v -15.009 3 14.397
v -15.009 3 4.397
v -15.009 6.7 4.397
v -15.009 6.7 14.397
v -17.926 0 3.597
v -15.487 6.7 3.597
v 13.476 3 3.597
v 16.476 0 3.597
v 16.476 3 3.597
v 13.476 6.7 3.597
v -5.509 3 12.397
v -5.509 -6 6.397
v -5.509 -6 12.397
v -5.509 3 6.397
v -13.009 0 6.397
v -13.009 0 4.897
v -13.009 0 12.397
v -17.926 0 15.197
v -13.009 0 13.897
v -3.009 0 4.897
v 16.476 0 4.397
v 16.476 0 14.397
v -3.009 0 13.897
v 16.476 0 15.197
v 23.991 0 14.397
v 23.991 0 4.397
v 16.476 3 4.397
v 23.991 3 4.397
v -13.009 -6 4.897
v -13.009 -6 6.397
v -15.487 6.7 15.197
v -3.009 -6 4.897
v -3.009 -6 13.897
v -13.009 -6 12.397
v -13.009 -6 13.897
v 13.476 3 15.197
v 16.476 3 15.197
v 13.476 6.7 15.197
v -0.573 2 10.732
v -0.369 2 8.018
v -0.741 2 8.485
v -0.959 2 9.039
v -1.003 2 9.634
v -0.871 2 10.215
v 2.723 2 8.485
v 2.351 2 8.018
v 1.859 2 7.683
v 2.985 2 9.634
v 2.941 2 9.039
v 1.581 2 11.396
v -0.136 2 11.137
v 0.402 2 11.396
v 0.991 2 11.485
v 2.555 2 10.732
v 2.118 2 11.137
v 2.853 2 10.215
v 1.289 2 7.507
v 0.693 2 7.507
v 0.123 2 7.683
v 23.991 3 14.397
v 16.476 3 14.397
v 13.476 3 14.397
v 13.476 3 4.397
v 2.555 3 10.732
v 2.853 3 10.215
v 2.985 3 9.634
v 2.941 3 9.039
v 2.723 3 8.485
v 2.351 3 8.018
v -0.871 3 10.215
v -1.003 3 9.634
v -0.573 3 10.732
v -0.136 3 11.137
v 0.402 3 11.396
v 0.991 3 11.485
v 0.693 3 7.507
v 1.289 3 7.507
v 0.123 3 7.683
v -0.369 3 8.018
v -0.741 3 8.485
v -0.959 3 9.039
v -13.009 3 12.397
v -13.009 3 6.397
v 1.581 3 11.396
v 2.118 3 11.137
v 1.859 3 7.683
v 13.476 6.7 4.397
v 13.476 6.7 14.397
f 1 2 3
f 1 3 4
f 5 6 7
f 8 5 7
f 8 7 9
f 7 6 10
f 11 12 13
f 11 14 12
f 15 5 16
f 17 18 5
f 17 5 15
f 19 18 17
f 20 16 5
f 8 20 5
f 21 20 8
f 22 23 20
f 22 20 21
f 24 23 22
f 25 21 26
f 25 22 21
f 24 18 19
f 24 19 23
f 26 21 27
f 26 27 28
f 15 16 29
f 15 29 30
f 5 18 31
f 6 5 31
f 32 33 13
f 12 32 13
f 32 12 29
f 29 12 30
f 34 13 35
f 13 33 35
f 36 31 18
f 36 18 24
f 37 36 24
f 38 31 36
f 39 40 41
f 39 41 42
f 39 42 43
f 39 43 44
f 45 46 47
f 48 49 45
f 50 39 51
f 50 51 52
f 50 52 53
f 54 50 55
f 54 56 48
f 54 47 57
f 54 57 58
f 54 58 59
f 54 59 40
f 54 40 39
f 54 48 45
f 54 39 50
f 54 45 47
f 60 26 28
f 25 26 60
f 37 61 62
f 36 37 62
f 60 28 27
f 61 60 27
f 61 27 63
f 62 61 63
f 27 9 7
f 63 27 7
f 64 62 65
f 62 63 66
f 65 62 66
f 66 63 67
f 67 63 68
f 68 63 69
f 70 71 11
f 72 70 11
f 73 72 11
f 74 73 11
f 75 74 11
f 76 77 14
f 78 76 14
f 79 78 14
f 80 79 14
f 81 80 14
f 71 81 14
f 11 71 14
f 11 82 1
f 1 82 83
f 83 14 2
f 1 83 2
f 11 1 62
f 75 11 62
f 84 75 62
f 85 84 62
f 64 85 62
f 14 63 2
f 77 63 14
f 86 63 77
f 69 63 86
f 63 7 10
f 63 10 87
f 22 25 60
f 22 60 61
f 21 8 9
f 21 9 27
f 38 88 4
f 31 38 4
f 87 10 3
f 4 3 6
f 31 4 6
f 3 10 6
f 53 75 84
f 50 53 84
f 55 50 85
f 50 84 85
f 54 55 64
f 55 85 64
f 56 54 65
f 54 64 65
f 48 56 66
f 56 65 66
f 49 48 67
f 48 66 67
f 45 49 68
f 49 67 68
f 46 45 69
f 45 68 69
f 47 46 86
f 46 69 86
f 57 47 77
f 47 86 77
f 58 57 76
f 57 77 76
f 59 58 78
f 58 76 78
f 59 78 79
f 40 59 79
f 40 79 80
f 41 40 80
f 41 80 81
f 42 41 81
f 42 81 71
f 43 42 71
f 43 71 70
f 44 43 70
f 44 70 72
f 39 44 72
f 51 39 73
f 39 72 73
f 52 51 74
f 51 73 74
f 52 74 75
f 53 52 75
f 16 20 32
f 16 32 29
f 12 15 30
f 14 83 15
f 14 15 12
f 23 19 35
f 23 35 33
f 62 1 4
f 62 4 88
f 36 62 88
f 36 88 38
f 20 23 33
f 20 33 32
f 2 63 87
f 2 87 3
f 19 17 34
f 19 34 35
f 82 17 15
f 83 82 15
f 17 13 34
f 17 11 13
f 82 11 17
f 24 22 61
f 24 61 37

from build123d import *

# Parameters (mm, degrees)
SKETCH_1_W          = 7.5
SKETCH_1_H          = 6
EXTRUDE_1_DEPTH     = 3
EXTRUDE_2_DEPTH     = 6
SKETCH_3_R          = 2
CUT_EXTRUDE_1_DEPTH = 1
EXTRUDE_3_DEPTH     = 3.7
EXTRUDE_4_DEPTH     = 11.6
CUT_EXTRUDE_2_DEPTH = 12


with BuildPart() as part:
    # 草图1 → 凸台-拉伸1 (new body)
    with BuildSketch(Plane(origin=(0, 0, 0), x_dir=(1, 0, 0), z_dir=(0, 1, 0))):
        Polygon((23.991089217, -4.397070764), (23.991089217, -14.397070764), (16.47582205, -14.397070764), (16.47582205, -15.197070764), (2.97582205, -15.197070764), (-4.02417795, -15.197070764), (-16.008910783, -15.197070764), (-16.008910783, -3.597070764), (-4.02417795, -3.597070764), (2.97582205, -3.597070764), (16.47582205, -3.597070764), (16.47582205, -4.397070764), align=None)
        with Locations((-9.258910783, -9.397070764)):
            Rectangle(SKETCH_1_W, SKETCH_1_H, mode=Mode.SUBTRACT)
    extrude(amount=EXTRUDE_1_DEPTH)

    # 草图2 → 凸台-拉伸2 (add)
    with BuildSketch(Plane.XZ):
        Polygon((-13.008910783, 12.397070764), (-13.008910783, 13.897070764), (-3.008910783, 13.897070764), (-3.008910783, 4.897070764), (-13.008910783, 4.897070764), (-13.008910783, 6.397070764), (-5.508910783, 6.397070764), (-5.508910783, 12.397070764), align=None)
    extrude(amount=EXTRUDE_2_DEPTH)

    # 草图3 → 切除-拉伸1 (cut)
    with BuildSketch(Plane(origin=(0, 3, 0), x_dir=(1, 0, 0), z_dir=(0, 1, 0))):
        with Locations(Location((0.991089217, -9.484524381, 0), (0, 0, 270))):
            Circle(SKETCH_3_R)
    extrude(amount=-CUT_EXTRUDE_1_DEPTH, mode=Mode.SUBTRACT)

    # 草图4 → 凸台-拉伸3 (add)
    with BuildSketch(Plane(origin=(0, 3, 0), x_dir=(1, 0, 0), z_dir=(0, 1, 0))):
        Polygon((-16.008910783, -3.597070764), (13.47582205, -3.597070764), (13.47582205, -4.397070764), (-15.008910783, -4.397070764), (-15.008910783, -14.397070764), (13.47582205, -14.397070764), (13.47582205, -15.197070764), (-16.008910783, -15.197070764), align=None)
    extrude(amount=EXTRUDE_3_DEPTH)

    # 草图7 → 凸台-拉伸4 (add)
    with BuildSketch(Plane.XY.offset(15.197070764)):
        Polygon((-16.008910783, 0), (-16.008910783, 6.7), (-18.447511353, 0), align=None)
    extrude(amount=-EXTRUDE_4_DEPTH)

    # 草图8 → 切除-拉伸2 (cut)
    with BuildSketch(Plane.XY.offset(15.197070764)):
        Polygon((-16.008910783, 6.7), (-18.447511353, 0), (-17.926064244, 0), (-15.487463675, 6.7), align=None)
    extrude(amount=-CUT_EXTRUDE_2_DEPTH, mode=Mode.SUBTRACT)


solid = part.part
